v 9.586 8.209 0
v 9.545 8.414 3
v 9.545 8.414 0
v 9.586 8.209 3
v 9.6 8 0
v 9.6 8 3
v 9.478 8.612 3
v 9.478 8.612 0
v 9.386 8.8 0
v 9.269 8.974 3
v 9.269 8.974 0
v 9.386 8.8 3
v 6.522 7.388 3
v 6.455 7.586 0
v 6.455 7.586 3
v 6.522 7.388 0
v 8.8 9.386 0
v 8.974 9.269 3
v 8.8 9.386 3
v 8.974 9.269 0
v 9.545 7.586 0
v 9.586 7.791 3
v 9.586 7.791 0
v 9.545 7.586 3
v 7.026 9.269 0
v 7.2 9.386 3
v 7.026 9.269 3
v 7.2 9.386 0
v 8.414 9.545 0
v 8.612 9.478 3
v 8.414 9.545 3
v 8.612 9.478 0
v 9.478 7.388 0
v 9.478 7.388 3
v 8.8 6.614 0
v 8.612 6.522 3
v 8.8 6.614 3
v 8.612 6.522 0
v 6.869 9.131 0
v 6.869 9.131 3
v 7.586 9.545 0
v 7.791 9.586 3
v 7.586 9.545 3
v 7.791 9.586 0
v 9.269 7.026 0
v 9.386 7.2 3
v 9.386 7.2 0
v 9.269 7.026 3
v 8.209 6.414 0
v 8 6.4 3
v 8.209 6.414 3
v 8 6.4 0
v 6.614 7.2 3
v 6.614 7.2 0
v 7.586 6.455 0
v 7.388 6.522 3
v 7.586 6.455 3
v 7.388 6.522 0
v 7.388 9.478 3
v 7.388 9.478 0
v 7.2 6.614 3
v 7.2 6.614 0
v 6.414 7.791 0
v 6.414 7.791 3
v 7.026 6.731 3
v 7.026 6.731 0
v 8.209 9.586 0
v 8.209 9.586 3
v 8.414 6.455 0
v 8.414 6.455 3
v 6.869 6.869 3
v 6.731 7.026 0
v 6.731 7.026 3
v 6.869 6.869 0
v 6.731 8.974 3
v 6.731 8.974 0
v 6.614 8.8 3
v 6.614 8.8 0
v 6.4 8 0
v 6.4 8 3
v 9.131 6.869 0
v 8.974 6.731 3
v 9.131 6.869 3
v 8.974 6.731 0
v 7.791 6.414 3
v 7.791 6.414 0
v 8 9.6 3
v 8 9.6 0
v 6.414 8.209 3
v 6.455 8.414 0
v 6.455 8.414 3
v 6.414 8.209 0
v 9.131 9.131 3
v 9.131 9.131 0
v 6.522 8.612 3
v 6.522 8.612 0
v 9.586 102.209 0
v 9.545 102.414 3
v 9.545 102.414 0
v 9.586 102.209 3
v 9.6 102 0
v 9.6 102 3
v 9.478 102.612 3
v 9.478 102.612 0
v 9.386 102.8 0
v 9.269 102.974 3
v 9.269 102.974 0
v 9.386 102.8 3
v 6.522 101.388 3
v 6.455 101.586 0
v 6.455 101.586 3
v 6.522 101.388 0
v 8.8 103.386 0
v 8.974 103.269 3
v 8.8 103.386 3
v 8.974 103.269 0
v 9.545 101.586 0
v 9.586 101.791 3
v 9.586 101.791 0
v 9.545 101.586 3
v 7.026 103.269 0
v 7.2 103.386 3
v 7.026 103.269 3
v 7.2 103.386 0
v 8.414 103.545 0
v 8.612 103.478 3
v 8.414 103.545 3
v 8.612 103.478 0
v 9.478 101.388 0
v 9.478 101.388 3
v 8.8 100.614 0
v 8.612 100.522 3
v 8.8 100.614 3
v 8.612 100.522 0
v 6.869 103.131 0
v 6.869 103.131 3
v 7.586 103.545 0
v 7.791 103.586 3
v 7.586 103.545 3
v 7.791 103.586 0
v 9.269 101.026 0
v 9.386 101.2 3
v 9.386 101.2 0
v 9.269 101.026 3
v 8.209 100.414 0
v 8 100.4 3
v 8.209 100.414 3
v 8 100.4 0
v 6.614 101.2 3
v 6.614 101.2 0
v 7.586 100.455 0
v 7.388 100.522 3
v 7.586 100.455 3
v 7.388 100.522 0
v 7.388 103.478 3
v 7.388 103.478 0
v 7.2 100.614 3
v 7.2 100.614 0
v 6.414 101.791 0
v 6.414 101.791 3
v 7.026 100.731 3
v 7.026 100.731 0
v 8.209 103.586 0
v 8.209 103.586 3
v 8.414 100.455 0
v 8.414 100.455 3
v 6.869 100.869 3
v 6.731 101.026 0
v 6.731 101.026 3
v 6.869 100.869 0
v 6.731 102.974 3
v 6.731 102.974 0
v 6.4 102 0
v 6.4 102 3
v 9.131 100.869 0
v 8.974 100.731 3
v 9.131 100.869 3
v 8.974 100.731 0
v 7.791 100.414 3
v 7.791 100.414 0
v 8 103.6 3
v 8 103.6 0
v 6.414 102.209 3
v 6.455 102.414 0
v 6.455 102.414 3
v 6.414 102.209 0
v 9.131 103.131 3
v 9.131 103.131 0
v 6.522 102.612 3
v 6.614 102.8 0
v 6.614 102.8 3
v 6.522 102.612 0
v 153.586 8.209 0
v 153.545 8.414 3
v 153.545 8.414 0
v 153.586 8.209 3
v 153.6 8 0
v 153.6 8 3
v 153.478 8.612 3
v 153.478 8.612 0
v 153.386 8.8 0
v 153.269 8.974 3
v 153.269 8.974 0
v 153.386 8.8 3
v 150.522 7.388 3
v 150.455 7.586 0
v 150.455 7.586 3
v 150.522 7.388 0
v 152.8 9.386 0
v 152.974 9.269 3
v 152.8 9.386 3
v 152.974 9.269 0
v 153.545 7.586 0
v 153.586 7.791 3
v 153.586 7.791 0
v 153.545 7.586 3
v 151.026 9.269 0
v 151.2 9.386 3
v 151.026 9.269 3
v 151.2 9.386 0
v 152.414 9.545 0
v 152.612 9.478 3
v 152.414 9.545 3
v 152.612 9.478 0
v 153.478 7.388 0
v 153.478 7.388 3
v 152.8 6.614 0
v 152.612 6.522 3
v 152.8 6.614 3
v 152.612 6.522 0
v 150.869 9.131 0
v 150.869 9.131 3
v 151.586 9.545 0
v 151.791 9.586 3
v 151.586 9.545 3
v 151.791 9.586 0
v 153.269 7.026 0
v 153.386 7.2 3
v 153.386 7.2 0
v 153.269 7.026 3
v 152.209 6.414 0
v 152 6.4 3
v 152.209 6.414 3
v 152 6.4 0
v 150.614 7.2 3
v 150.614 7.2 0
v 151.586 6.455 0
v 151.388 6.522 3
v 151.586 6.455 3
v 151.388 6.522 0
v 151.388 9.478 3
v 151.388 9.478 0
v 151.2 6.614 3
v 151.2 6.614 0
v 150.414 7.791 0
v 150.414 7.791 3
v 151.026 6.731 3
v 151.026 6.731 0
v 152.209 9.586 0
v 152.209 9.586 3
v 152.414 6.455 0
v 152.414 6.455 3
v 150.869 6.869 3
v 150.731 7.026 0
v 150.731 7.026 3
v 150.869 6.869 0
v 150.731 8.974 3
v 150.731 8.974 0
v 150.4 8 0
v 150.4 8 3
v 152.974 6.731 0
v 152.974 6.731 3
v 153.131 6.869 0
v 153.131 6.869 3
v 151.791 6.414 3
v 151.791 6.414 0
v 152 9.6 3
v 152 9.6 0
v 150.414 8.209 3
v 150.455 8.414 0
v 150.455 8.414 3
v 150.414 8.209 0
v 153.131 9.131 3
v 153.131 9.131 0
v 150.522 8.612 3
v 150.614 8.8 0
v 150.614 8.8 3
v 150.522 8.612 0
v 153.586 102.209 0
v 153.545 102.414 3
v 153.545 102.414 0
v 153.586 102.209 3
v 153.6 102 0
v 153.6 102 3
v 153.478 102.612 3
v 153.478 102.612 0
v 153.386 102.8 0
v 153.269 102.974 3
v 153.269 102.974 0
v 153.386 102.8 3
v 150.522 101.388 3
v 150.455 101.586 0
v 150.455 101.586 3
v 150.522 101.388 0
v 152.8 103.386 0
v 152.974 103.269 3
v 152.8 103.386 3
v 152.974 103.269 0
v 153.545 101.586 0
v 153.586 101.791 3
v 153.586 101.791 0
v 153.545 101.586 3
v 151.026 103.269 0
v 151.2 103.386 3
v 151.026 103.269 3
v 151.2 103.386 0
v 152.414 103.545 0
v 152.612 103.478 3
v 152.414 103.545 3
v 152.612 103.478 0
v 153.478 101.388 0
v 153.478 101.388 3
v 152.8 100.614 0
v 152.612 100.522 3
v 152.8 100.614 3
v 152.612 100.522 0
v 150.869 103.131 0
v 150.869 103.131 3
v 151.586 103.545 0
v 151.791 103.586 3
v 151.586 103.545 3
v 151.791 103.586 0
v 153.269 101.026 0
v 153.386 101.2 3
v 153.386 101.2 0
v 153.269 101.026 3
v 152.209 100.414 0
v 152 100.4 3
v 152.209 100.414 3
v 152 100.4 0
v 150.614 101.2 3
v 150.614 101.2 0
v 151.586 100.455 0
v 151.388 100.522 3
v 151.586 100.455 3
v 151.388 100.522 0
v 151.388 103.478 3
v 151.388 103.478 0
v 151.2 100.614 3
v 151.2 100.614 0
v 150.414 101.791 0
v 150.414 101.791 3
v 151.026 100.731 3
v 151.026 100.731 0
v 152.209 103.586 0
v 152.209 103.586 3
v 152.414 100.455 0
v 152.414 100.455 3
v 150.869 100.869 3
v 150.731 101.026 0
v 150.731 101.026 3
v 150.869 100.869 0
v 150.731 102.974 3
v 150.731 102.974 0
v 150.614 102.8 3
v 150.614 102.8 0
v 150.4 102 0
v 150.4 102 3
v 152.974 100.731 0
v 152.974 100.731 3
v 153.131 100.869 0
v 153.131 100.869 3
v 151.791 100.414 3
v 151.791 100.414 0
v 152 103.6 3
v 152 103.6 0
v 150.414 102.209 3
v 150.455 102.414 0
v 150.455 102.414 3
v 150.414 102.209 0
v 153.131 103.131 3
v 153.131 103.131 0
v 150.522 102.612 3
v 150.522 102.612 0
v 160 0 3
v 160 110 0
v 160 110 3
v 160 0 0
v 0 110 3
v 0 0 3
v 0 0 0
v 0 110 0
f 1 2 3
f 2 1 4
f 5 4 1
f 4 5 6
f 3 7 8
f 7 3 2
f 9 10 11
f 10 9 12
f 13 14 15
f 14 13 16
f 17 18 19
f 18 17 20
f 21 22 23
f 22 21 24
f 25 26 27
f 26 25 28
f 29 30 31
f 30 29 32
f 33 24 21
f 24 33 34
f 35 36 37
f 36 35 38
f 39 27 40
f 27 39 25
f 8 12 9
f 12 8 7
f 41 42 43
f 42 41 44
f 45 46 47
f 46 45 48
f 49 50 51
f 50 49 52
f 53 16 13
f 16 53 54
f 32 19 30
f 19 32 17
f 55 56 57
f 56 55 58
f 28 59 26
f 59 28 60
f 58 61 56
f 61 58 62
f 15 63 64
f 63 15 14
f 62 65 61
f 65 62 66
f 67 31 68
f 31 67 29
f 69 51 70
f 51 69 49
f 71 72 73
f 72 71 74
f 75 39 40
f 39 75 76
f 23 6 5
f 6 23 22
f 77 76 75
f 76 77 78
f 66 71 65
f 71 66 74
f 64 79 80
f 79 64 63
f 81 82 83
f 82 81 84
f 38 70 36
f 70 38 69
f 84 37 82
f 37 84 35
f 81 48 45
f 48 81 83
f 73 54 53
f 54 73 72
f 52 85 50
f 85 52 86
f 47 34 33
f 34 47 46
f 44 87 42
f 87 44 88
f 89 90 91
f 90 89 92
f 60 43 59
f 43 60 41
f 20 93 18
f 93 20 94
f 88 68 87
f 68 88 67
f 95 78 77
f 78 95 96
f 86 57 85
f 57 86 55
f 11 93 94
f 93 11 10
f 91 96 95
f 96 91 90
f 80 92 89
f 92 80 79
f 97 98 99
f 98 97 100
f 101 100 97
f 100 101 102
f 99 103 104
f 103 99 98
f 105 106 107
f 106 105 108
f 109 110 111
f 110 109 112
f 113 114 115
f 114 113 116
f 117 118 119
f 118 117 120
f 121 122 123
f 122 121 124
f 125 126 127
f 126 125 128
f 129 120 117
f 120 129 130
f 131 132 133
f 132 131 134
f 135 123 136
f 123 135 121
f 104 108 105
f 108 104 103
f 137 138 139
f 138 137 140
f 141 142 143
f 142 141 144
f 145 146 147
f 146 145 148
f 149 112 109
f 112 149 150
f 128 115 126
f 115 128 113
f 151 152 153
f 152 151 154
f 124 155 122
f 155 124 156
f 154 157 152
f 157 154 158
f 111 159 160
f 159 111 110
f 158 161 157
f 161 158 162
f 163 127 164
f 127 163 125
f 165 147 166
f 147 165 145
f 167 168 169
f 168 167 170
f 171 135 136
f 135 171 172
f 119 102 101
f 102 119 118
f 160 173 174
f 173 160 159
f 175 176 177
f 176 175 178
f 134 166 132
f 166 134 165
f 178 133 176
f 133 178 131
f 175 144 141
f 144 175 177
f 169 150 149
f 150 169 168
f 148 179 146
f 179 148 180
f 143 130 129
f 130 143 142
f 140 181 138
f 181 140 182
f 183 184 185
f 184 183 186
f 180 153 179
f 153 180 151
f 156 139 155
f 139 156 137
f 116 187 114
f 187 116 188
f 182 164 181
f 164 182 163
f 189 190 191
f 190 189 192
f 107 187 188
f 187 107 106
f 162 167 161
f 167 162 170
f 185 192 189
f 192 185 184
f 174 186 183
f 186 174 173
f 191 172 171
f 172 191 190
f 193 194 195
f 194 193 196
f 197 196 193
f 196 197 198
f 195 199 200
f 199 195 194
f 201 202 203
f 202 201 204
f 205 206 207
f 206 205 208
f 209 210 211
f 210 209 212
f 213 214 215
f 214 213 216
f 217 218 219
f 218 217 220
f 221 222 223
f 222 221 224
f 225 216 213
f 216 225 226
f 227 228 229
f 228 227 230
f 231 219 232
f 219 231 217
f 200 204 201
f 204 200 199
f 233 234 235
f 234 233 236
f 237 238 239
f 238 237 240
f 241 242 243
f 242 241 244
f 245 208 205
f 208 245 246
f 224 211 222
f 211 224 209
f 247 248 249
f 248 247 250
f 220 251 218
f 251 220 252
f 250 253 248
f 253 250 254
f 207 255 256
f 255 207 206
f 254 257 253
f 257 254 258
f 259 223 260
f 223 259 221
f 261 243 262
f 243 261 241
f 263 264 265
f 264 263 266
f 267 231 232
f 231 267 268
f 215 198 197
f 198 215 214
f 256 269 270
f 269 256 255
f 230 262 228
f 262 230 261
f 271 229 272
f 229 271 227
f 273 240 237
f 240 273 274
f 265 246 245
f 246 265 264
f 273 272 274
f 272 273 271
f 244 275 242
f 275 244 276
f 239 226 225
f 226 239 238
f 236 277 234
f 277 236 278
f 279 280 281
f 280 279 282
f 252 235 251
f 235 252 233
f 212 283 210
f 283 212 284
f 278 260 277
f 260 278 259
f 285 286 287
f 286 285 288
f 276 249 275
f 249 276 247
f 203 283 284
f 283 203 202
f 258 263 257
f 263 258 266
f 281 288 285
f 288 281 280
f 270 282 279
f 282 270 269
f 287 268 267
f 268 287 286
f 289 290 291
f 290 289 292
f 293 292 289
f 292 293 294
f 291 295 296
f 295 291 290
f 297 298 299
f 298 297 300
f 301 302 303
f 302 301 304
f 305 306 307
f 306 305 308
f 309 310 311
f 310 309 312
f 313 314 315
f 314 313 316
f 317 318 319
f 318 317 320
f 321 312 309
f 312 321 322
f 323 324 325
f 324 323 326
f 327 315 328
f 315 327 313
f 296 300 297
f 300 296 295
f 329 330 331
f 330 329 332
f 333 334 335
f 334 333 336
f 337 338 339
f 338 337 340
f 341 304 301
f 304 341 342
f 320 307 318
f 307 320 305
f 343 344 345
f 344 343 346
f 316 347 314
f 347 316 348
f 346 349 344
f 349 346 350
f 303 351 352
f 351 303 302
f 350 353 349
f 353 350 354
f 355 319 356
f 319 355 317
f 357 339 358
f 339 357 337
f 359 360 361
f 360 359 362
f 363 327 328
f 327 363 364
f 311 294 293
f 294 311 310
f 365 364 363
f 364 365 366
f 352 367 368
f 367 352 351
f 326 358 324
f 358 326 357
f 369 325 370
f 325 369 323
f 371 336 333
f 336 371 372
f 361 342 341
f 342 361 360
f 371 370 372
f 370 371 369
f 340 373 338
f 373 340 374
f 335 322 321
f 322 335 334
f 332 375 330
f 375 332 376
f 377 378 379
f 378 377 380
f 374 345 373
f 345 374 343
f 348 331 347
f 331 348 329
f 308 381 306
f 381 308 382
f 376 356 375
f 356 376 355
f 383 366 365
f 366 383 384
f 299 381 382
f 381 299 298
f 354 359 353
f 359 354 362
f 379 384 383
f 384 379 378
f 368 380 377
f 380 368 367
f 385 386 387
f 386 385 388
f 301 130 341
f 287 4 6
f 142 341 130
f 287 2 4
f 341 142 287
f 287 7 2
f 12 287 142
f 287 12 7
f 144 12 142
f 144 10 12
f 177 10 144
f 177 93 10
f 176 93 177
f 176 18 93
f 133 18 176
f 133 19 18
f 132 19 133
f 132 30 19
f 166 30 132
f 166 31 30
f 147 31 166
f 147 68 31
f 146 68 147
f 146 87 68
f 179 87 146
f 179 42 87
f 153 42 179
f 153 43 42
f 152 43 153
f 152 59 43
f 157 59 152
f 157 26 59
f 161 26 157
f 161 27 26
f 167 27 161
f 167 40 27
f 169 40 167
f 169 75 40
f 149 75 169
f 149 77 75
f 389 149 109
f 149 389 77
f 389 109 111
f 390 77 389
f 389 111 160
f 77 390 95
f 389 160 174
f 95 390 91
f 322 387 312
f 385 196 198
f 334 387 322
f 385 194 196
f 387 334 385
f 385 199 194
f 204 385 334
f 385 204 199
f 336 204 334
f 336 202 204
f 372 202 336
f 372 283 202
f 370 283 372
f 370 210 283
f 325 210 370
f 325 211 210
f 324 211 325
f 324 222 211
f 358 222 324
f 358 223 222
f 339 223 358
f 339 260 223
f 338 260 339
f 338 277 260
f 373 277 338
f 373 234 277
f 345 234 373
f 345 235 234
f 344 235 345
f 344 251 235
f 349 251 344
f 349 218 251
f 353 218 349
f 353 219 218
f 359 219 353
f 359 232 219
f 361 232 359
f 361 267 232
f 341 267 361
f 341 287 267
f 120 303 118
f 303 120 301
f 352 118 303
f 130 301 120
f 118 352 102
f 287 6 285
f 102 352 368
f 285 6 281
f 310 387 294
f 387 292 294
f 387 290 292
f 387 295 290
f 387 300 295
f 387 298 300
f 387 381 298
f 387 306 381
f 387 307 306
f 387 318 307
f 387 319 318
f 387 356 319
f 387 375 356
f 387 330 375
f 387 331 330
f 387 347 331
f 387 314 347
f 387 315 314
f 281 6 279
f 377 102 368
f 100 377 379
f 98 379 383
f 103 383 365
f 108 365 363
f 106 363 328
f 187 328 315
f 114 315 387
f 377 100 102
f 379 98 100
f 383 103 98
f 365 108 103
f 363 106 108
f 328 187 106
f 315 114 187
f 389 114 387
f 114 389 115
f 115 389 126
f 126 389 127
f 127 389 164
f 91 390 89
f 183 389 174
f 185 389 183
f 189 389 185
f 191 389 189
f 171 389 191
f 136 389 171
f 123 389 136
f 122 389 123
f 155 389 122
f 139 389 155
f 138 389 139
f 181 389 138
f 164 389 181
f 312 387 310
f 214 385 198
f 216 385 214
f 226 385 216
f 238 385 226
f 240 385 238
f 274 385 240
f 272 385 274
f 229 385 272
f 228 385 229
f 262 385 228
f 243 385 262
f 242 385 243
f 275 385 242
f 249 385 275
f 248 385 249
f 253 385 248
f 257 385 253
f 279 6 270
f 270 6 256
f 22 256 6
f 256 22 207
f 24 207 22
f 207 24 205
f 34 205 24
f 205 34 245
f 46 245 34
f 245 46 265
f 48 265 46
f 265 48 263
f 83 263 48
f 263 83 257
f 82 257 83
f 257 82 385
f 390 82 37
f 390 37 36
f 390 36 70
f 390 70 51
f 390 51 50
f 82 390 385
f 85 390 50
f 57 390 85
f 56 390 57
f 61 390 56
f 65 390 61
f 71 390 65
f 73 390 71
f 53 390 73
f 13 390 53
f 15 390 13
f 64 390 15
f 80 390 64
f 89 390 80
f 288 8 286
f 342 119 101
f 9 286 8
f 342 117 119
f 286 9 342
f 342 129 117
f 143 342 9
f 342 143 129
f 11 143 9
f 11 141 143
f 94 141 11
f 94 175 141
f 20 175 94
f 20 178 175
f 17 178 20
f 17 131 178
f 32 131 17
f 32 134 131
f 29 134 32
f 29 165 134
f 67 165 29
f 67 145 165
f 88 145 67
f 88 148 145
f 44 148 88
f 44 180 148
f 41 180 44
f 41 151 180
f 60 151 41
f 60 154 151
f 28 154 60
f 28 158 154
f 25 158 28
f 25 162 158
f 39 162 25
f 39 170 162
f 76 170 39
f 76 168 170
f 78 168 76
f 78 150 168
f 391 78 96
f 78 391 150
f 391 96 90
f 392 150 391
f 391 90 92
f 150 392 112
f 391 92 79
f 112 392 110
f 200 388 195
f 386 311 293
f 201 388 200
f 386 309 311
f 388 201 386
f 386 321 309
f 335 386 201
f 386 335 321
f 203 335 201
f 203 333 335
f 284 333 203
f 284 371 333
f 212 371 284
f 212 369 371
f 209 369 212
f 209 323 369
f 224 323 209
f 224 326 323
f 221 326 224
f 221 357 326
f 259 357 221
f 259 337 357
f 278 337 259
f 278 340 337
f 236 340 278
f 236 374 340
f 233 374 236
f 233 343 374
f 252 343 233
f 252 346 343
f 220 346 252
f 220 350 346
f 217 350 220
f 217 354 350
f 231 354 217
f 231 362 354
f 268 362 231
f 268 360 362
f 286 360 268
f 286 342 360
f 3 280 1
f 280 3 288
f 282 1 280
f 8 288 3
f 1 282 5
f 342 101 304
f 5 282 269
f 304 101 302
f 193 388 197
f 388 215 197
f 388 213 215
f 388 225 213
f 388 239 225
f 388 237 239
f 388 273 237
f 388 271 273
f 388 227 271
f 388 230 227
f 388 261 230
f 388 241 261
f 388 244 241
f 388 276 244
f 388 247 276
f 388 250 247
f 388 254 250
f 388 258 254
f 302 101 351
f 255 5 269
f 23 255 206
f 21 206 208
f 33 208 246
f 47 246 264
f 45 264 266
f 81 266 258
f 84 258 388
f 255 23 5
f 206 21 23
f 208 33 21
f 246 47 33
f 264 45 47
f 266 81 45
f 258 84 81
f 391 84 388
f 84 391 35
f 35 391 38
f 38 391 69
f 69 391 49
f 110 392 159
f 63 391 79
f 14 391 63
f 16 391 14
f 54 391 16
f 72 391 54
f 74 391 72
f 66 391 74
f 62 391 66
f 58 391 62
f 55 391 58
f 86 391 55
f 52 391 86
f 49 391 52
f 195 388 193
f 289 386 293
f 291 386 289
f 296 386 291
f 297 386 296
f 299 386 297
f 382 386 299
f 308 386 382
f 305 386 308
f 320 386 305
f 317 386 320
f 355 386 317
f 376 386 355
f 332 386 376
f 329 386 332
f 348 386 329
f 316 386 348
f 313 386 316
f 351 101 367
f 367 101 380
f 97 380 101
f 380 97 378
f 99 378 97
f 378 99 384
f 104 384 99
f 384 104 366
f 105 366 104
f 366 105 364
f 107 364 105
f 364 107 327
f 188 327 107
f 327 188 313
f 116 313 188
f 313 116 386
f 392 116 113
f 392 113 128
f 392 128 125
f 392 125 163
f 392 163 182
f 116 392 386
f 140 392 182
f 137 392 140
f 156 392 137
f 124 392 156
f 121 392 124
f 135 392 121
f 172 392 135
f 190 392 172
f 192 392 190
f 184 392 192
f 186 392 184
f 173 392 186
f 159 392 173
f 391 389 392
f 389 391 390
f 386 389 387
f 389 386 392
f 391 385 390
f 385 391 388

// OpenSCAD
// Smart Kitchen LPG Safety System
// Flat enclosure lid
// Units: mm

$fn = 48;

length = 160;
width = 110;
thickness = 3;
hole_d = 3.2;
offset = 8;

difference() {
cube([length, width, thickness]);

for (x = [offset, length-offset])
    for (y = [offset, width-offset])
        translate([x, y, -0.1])
            cylinder(
                h = thickness + 0.2,
                d = hole_d
            );

}
